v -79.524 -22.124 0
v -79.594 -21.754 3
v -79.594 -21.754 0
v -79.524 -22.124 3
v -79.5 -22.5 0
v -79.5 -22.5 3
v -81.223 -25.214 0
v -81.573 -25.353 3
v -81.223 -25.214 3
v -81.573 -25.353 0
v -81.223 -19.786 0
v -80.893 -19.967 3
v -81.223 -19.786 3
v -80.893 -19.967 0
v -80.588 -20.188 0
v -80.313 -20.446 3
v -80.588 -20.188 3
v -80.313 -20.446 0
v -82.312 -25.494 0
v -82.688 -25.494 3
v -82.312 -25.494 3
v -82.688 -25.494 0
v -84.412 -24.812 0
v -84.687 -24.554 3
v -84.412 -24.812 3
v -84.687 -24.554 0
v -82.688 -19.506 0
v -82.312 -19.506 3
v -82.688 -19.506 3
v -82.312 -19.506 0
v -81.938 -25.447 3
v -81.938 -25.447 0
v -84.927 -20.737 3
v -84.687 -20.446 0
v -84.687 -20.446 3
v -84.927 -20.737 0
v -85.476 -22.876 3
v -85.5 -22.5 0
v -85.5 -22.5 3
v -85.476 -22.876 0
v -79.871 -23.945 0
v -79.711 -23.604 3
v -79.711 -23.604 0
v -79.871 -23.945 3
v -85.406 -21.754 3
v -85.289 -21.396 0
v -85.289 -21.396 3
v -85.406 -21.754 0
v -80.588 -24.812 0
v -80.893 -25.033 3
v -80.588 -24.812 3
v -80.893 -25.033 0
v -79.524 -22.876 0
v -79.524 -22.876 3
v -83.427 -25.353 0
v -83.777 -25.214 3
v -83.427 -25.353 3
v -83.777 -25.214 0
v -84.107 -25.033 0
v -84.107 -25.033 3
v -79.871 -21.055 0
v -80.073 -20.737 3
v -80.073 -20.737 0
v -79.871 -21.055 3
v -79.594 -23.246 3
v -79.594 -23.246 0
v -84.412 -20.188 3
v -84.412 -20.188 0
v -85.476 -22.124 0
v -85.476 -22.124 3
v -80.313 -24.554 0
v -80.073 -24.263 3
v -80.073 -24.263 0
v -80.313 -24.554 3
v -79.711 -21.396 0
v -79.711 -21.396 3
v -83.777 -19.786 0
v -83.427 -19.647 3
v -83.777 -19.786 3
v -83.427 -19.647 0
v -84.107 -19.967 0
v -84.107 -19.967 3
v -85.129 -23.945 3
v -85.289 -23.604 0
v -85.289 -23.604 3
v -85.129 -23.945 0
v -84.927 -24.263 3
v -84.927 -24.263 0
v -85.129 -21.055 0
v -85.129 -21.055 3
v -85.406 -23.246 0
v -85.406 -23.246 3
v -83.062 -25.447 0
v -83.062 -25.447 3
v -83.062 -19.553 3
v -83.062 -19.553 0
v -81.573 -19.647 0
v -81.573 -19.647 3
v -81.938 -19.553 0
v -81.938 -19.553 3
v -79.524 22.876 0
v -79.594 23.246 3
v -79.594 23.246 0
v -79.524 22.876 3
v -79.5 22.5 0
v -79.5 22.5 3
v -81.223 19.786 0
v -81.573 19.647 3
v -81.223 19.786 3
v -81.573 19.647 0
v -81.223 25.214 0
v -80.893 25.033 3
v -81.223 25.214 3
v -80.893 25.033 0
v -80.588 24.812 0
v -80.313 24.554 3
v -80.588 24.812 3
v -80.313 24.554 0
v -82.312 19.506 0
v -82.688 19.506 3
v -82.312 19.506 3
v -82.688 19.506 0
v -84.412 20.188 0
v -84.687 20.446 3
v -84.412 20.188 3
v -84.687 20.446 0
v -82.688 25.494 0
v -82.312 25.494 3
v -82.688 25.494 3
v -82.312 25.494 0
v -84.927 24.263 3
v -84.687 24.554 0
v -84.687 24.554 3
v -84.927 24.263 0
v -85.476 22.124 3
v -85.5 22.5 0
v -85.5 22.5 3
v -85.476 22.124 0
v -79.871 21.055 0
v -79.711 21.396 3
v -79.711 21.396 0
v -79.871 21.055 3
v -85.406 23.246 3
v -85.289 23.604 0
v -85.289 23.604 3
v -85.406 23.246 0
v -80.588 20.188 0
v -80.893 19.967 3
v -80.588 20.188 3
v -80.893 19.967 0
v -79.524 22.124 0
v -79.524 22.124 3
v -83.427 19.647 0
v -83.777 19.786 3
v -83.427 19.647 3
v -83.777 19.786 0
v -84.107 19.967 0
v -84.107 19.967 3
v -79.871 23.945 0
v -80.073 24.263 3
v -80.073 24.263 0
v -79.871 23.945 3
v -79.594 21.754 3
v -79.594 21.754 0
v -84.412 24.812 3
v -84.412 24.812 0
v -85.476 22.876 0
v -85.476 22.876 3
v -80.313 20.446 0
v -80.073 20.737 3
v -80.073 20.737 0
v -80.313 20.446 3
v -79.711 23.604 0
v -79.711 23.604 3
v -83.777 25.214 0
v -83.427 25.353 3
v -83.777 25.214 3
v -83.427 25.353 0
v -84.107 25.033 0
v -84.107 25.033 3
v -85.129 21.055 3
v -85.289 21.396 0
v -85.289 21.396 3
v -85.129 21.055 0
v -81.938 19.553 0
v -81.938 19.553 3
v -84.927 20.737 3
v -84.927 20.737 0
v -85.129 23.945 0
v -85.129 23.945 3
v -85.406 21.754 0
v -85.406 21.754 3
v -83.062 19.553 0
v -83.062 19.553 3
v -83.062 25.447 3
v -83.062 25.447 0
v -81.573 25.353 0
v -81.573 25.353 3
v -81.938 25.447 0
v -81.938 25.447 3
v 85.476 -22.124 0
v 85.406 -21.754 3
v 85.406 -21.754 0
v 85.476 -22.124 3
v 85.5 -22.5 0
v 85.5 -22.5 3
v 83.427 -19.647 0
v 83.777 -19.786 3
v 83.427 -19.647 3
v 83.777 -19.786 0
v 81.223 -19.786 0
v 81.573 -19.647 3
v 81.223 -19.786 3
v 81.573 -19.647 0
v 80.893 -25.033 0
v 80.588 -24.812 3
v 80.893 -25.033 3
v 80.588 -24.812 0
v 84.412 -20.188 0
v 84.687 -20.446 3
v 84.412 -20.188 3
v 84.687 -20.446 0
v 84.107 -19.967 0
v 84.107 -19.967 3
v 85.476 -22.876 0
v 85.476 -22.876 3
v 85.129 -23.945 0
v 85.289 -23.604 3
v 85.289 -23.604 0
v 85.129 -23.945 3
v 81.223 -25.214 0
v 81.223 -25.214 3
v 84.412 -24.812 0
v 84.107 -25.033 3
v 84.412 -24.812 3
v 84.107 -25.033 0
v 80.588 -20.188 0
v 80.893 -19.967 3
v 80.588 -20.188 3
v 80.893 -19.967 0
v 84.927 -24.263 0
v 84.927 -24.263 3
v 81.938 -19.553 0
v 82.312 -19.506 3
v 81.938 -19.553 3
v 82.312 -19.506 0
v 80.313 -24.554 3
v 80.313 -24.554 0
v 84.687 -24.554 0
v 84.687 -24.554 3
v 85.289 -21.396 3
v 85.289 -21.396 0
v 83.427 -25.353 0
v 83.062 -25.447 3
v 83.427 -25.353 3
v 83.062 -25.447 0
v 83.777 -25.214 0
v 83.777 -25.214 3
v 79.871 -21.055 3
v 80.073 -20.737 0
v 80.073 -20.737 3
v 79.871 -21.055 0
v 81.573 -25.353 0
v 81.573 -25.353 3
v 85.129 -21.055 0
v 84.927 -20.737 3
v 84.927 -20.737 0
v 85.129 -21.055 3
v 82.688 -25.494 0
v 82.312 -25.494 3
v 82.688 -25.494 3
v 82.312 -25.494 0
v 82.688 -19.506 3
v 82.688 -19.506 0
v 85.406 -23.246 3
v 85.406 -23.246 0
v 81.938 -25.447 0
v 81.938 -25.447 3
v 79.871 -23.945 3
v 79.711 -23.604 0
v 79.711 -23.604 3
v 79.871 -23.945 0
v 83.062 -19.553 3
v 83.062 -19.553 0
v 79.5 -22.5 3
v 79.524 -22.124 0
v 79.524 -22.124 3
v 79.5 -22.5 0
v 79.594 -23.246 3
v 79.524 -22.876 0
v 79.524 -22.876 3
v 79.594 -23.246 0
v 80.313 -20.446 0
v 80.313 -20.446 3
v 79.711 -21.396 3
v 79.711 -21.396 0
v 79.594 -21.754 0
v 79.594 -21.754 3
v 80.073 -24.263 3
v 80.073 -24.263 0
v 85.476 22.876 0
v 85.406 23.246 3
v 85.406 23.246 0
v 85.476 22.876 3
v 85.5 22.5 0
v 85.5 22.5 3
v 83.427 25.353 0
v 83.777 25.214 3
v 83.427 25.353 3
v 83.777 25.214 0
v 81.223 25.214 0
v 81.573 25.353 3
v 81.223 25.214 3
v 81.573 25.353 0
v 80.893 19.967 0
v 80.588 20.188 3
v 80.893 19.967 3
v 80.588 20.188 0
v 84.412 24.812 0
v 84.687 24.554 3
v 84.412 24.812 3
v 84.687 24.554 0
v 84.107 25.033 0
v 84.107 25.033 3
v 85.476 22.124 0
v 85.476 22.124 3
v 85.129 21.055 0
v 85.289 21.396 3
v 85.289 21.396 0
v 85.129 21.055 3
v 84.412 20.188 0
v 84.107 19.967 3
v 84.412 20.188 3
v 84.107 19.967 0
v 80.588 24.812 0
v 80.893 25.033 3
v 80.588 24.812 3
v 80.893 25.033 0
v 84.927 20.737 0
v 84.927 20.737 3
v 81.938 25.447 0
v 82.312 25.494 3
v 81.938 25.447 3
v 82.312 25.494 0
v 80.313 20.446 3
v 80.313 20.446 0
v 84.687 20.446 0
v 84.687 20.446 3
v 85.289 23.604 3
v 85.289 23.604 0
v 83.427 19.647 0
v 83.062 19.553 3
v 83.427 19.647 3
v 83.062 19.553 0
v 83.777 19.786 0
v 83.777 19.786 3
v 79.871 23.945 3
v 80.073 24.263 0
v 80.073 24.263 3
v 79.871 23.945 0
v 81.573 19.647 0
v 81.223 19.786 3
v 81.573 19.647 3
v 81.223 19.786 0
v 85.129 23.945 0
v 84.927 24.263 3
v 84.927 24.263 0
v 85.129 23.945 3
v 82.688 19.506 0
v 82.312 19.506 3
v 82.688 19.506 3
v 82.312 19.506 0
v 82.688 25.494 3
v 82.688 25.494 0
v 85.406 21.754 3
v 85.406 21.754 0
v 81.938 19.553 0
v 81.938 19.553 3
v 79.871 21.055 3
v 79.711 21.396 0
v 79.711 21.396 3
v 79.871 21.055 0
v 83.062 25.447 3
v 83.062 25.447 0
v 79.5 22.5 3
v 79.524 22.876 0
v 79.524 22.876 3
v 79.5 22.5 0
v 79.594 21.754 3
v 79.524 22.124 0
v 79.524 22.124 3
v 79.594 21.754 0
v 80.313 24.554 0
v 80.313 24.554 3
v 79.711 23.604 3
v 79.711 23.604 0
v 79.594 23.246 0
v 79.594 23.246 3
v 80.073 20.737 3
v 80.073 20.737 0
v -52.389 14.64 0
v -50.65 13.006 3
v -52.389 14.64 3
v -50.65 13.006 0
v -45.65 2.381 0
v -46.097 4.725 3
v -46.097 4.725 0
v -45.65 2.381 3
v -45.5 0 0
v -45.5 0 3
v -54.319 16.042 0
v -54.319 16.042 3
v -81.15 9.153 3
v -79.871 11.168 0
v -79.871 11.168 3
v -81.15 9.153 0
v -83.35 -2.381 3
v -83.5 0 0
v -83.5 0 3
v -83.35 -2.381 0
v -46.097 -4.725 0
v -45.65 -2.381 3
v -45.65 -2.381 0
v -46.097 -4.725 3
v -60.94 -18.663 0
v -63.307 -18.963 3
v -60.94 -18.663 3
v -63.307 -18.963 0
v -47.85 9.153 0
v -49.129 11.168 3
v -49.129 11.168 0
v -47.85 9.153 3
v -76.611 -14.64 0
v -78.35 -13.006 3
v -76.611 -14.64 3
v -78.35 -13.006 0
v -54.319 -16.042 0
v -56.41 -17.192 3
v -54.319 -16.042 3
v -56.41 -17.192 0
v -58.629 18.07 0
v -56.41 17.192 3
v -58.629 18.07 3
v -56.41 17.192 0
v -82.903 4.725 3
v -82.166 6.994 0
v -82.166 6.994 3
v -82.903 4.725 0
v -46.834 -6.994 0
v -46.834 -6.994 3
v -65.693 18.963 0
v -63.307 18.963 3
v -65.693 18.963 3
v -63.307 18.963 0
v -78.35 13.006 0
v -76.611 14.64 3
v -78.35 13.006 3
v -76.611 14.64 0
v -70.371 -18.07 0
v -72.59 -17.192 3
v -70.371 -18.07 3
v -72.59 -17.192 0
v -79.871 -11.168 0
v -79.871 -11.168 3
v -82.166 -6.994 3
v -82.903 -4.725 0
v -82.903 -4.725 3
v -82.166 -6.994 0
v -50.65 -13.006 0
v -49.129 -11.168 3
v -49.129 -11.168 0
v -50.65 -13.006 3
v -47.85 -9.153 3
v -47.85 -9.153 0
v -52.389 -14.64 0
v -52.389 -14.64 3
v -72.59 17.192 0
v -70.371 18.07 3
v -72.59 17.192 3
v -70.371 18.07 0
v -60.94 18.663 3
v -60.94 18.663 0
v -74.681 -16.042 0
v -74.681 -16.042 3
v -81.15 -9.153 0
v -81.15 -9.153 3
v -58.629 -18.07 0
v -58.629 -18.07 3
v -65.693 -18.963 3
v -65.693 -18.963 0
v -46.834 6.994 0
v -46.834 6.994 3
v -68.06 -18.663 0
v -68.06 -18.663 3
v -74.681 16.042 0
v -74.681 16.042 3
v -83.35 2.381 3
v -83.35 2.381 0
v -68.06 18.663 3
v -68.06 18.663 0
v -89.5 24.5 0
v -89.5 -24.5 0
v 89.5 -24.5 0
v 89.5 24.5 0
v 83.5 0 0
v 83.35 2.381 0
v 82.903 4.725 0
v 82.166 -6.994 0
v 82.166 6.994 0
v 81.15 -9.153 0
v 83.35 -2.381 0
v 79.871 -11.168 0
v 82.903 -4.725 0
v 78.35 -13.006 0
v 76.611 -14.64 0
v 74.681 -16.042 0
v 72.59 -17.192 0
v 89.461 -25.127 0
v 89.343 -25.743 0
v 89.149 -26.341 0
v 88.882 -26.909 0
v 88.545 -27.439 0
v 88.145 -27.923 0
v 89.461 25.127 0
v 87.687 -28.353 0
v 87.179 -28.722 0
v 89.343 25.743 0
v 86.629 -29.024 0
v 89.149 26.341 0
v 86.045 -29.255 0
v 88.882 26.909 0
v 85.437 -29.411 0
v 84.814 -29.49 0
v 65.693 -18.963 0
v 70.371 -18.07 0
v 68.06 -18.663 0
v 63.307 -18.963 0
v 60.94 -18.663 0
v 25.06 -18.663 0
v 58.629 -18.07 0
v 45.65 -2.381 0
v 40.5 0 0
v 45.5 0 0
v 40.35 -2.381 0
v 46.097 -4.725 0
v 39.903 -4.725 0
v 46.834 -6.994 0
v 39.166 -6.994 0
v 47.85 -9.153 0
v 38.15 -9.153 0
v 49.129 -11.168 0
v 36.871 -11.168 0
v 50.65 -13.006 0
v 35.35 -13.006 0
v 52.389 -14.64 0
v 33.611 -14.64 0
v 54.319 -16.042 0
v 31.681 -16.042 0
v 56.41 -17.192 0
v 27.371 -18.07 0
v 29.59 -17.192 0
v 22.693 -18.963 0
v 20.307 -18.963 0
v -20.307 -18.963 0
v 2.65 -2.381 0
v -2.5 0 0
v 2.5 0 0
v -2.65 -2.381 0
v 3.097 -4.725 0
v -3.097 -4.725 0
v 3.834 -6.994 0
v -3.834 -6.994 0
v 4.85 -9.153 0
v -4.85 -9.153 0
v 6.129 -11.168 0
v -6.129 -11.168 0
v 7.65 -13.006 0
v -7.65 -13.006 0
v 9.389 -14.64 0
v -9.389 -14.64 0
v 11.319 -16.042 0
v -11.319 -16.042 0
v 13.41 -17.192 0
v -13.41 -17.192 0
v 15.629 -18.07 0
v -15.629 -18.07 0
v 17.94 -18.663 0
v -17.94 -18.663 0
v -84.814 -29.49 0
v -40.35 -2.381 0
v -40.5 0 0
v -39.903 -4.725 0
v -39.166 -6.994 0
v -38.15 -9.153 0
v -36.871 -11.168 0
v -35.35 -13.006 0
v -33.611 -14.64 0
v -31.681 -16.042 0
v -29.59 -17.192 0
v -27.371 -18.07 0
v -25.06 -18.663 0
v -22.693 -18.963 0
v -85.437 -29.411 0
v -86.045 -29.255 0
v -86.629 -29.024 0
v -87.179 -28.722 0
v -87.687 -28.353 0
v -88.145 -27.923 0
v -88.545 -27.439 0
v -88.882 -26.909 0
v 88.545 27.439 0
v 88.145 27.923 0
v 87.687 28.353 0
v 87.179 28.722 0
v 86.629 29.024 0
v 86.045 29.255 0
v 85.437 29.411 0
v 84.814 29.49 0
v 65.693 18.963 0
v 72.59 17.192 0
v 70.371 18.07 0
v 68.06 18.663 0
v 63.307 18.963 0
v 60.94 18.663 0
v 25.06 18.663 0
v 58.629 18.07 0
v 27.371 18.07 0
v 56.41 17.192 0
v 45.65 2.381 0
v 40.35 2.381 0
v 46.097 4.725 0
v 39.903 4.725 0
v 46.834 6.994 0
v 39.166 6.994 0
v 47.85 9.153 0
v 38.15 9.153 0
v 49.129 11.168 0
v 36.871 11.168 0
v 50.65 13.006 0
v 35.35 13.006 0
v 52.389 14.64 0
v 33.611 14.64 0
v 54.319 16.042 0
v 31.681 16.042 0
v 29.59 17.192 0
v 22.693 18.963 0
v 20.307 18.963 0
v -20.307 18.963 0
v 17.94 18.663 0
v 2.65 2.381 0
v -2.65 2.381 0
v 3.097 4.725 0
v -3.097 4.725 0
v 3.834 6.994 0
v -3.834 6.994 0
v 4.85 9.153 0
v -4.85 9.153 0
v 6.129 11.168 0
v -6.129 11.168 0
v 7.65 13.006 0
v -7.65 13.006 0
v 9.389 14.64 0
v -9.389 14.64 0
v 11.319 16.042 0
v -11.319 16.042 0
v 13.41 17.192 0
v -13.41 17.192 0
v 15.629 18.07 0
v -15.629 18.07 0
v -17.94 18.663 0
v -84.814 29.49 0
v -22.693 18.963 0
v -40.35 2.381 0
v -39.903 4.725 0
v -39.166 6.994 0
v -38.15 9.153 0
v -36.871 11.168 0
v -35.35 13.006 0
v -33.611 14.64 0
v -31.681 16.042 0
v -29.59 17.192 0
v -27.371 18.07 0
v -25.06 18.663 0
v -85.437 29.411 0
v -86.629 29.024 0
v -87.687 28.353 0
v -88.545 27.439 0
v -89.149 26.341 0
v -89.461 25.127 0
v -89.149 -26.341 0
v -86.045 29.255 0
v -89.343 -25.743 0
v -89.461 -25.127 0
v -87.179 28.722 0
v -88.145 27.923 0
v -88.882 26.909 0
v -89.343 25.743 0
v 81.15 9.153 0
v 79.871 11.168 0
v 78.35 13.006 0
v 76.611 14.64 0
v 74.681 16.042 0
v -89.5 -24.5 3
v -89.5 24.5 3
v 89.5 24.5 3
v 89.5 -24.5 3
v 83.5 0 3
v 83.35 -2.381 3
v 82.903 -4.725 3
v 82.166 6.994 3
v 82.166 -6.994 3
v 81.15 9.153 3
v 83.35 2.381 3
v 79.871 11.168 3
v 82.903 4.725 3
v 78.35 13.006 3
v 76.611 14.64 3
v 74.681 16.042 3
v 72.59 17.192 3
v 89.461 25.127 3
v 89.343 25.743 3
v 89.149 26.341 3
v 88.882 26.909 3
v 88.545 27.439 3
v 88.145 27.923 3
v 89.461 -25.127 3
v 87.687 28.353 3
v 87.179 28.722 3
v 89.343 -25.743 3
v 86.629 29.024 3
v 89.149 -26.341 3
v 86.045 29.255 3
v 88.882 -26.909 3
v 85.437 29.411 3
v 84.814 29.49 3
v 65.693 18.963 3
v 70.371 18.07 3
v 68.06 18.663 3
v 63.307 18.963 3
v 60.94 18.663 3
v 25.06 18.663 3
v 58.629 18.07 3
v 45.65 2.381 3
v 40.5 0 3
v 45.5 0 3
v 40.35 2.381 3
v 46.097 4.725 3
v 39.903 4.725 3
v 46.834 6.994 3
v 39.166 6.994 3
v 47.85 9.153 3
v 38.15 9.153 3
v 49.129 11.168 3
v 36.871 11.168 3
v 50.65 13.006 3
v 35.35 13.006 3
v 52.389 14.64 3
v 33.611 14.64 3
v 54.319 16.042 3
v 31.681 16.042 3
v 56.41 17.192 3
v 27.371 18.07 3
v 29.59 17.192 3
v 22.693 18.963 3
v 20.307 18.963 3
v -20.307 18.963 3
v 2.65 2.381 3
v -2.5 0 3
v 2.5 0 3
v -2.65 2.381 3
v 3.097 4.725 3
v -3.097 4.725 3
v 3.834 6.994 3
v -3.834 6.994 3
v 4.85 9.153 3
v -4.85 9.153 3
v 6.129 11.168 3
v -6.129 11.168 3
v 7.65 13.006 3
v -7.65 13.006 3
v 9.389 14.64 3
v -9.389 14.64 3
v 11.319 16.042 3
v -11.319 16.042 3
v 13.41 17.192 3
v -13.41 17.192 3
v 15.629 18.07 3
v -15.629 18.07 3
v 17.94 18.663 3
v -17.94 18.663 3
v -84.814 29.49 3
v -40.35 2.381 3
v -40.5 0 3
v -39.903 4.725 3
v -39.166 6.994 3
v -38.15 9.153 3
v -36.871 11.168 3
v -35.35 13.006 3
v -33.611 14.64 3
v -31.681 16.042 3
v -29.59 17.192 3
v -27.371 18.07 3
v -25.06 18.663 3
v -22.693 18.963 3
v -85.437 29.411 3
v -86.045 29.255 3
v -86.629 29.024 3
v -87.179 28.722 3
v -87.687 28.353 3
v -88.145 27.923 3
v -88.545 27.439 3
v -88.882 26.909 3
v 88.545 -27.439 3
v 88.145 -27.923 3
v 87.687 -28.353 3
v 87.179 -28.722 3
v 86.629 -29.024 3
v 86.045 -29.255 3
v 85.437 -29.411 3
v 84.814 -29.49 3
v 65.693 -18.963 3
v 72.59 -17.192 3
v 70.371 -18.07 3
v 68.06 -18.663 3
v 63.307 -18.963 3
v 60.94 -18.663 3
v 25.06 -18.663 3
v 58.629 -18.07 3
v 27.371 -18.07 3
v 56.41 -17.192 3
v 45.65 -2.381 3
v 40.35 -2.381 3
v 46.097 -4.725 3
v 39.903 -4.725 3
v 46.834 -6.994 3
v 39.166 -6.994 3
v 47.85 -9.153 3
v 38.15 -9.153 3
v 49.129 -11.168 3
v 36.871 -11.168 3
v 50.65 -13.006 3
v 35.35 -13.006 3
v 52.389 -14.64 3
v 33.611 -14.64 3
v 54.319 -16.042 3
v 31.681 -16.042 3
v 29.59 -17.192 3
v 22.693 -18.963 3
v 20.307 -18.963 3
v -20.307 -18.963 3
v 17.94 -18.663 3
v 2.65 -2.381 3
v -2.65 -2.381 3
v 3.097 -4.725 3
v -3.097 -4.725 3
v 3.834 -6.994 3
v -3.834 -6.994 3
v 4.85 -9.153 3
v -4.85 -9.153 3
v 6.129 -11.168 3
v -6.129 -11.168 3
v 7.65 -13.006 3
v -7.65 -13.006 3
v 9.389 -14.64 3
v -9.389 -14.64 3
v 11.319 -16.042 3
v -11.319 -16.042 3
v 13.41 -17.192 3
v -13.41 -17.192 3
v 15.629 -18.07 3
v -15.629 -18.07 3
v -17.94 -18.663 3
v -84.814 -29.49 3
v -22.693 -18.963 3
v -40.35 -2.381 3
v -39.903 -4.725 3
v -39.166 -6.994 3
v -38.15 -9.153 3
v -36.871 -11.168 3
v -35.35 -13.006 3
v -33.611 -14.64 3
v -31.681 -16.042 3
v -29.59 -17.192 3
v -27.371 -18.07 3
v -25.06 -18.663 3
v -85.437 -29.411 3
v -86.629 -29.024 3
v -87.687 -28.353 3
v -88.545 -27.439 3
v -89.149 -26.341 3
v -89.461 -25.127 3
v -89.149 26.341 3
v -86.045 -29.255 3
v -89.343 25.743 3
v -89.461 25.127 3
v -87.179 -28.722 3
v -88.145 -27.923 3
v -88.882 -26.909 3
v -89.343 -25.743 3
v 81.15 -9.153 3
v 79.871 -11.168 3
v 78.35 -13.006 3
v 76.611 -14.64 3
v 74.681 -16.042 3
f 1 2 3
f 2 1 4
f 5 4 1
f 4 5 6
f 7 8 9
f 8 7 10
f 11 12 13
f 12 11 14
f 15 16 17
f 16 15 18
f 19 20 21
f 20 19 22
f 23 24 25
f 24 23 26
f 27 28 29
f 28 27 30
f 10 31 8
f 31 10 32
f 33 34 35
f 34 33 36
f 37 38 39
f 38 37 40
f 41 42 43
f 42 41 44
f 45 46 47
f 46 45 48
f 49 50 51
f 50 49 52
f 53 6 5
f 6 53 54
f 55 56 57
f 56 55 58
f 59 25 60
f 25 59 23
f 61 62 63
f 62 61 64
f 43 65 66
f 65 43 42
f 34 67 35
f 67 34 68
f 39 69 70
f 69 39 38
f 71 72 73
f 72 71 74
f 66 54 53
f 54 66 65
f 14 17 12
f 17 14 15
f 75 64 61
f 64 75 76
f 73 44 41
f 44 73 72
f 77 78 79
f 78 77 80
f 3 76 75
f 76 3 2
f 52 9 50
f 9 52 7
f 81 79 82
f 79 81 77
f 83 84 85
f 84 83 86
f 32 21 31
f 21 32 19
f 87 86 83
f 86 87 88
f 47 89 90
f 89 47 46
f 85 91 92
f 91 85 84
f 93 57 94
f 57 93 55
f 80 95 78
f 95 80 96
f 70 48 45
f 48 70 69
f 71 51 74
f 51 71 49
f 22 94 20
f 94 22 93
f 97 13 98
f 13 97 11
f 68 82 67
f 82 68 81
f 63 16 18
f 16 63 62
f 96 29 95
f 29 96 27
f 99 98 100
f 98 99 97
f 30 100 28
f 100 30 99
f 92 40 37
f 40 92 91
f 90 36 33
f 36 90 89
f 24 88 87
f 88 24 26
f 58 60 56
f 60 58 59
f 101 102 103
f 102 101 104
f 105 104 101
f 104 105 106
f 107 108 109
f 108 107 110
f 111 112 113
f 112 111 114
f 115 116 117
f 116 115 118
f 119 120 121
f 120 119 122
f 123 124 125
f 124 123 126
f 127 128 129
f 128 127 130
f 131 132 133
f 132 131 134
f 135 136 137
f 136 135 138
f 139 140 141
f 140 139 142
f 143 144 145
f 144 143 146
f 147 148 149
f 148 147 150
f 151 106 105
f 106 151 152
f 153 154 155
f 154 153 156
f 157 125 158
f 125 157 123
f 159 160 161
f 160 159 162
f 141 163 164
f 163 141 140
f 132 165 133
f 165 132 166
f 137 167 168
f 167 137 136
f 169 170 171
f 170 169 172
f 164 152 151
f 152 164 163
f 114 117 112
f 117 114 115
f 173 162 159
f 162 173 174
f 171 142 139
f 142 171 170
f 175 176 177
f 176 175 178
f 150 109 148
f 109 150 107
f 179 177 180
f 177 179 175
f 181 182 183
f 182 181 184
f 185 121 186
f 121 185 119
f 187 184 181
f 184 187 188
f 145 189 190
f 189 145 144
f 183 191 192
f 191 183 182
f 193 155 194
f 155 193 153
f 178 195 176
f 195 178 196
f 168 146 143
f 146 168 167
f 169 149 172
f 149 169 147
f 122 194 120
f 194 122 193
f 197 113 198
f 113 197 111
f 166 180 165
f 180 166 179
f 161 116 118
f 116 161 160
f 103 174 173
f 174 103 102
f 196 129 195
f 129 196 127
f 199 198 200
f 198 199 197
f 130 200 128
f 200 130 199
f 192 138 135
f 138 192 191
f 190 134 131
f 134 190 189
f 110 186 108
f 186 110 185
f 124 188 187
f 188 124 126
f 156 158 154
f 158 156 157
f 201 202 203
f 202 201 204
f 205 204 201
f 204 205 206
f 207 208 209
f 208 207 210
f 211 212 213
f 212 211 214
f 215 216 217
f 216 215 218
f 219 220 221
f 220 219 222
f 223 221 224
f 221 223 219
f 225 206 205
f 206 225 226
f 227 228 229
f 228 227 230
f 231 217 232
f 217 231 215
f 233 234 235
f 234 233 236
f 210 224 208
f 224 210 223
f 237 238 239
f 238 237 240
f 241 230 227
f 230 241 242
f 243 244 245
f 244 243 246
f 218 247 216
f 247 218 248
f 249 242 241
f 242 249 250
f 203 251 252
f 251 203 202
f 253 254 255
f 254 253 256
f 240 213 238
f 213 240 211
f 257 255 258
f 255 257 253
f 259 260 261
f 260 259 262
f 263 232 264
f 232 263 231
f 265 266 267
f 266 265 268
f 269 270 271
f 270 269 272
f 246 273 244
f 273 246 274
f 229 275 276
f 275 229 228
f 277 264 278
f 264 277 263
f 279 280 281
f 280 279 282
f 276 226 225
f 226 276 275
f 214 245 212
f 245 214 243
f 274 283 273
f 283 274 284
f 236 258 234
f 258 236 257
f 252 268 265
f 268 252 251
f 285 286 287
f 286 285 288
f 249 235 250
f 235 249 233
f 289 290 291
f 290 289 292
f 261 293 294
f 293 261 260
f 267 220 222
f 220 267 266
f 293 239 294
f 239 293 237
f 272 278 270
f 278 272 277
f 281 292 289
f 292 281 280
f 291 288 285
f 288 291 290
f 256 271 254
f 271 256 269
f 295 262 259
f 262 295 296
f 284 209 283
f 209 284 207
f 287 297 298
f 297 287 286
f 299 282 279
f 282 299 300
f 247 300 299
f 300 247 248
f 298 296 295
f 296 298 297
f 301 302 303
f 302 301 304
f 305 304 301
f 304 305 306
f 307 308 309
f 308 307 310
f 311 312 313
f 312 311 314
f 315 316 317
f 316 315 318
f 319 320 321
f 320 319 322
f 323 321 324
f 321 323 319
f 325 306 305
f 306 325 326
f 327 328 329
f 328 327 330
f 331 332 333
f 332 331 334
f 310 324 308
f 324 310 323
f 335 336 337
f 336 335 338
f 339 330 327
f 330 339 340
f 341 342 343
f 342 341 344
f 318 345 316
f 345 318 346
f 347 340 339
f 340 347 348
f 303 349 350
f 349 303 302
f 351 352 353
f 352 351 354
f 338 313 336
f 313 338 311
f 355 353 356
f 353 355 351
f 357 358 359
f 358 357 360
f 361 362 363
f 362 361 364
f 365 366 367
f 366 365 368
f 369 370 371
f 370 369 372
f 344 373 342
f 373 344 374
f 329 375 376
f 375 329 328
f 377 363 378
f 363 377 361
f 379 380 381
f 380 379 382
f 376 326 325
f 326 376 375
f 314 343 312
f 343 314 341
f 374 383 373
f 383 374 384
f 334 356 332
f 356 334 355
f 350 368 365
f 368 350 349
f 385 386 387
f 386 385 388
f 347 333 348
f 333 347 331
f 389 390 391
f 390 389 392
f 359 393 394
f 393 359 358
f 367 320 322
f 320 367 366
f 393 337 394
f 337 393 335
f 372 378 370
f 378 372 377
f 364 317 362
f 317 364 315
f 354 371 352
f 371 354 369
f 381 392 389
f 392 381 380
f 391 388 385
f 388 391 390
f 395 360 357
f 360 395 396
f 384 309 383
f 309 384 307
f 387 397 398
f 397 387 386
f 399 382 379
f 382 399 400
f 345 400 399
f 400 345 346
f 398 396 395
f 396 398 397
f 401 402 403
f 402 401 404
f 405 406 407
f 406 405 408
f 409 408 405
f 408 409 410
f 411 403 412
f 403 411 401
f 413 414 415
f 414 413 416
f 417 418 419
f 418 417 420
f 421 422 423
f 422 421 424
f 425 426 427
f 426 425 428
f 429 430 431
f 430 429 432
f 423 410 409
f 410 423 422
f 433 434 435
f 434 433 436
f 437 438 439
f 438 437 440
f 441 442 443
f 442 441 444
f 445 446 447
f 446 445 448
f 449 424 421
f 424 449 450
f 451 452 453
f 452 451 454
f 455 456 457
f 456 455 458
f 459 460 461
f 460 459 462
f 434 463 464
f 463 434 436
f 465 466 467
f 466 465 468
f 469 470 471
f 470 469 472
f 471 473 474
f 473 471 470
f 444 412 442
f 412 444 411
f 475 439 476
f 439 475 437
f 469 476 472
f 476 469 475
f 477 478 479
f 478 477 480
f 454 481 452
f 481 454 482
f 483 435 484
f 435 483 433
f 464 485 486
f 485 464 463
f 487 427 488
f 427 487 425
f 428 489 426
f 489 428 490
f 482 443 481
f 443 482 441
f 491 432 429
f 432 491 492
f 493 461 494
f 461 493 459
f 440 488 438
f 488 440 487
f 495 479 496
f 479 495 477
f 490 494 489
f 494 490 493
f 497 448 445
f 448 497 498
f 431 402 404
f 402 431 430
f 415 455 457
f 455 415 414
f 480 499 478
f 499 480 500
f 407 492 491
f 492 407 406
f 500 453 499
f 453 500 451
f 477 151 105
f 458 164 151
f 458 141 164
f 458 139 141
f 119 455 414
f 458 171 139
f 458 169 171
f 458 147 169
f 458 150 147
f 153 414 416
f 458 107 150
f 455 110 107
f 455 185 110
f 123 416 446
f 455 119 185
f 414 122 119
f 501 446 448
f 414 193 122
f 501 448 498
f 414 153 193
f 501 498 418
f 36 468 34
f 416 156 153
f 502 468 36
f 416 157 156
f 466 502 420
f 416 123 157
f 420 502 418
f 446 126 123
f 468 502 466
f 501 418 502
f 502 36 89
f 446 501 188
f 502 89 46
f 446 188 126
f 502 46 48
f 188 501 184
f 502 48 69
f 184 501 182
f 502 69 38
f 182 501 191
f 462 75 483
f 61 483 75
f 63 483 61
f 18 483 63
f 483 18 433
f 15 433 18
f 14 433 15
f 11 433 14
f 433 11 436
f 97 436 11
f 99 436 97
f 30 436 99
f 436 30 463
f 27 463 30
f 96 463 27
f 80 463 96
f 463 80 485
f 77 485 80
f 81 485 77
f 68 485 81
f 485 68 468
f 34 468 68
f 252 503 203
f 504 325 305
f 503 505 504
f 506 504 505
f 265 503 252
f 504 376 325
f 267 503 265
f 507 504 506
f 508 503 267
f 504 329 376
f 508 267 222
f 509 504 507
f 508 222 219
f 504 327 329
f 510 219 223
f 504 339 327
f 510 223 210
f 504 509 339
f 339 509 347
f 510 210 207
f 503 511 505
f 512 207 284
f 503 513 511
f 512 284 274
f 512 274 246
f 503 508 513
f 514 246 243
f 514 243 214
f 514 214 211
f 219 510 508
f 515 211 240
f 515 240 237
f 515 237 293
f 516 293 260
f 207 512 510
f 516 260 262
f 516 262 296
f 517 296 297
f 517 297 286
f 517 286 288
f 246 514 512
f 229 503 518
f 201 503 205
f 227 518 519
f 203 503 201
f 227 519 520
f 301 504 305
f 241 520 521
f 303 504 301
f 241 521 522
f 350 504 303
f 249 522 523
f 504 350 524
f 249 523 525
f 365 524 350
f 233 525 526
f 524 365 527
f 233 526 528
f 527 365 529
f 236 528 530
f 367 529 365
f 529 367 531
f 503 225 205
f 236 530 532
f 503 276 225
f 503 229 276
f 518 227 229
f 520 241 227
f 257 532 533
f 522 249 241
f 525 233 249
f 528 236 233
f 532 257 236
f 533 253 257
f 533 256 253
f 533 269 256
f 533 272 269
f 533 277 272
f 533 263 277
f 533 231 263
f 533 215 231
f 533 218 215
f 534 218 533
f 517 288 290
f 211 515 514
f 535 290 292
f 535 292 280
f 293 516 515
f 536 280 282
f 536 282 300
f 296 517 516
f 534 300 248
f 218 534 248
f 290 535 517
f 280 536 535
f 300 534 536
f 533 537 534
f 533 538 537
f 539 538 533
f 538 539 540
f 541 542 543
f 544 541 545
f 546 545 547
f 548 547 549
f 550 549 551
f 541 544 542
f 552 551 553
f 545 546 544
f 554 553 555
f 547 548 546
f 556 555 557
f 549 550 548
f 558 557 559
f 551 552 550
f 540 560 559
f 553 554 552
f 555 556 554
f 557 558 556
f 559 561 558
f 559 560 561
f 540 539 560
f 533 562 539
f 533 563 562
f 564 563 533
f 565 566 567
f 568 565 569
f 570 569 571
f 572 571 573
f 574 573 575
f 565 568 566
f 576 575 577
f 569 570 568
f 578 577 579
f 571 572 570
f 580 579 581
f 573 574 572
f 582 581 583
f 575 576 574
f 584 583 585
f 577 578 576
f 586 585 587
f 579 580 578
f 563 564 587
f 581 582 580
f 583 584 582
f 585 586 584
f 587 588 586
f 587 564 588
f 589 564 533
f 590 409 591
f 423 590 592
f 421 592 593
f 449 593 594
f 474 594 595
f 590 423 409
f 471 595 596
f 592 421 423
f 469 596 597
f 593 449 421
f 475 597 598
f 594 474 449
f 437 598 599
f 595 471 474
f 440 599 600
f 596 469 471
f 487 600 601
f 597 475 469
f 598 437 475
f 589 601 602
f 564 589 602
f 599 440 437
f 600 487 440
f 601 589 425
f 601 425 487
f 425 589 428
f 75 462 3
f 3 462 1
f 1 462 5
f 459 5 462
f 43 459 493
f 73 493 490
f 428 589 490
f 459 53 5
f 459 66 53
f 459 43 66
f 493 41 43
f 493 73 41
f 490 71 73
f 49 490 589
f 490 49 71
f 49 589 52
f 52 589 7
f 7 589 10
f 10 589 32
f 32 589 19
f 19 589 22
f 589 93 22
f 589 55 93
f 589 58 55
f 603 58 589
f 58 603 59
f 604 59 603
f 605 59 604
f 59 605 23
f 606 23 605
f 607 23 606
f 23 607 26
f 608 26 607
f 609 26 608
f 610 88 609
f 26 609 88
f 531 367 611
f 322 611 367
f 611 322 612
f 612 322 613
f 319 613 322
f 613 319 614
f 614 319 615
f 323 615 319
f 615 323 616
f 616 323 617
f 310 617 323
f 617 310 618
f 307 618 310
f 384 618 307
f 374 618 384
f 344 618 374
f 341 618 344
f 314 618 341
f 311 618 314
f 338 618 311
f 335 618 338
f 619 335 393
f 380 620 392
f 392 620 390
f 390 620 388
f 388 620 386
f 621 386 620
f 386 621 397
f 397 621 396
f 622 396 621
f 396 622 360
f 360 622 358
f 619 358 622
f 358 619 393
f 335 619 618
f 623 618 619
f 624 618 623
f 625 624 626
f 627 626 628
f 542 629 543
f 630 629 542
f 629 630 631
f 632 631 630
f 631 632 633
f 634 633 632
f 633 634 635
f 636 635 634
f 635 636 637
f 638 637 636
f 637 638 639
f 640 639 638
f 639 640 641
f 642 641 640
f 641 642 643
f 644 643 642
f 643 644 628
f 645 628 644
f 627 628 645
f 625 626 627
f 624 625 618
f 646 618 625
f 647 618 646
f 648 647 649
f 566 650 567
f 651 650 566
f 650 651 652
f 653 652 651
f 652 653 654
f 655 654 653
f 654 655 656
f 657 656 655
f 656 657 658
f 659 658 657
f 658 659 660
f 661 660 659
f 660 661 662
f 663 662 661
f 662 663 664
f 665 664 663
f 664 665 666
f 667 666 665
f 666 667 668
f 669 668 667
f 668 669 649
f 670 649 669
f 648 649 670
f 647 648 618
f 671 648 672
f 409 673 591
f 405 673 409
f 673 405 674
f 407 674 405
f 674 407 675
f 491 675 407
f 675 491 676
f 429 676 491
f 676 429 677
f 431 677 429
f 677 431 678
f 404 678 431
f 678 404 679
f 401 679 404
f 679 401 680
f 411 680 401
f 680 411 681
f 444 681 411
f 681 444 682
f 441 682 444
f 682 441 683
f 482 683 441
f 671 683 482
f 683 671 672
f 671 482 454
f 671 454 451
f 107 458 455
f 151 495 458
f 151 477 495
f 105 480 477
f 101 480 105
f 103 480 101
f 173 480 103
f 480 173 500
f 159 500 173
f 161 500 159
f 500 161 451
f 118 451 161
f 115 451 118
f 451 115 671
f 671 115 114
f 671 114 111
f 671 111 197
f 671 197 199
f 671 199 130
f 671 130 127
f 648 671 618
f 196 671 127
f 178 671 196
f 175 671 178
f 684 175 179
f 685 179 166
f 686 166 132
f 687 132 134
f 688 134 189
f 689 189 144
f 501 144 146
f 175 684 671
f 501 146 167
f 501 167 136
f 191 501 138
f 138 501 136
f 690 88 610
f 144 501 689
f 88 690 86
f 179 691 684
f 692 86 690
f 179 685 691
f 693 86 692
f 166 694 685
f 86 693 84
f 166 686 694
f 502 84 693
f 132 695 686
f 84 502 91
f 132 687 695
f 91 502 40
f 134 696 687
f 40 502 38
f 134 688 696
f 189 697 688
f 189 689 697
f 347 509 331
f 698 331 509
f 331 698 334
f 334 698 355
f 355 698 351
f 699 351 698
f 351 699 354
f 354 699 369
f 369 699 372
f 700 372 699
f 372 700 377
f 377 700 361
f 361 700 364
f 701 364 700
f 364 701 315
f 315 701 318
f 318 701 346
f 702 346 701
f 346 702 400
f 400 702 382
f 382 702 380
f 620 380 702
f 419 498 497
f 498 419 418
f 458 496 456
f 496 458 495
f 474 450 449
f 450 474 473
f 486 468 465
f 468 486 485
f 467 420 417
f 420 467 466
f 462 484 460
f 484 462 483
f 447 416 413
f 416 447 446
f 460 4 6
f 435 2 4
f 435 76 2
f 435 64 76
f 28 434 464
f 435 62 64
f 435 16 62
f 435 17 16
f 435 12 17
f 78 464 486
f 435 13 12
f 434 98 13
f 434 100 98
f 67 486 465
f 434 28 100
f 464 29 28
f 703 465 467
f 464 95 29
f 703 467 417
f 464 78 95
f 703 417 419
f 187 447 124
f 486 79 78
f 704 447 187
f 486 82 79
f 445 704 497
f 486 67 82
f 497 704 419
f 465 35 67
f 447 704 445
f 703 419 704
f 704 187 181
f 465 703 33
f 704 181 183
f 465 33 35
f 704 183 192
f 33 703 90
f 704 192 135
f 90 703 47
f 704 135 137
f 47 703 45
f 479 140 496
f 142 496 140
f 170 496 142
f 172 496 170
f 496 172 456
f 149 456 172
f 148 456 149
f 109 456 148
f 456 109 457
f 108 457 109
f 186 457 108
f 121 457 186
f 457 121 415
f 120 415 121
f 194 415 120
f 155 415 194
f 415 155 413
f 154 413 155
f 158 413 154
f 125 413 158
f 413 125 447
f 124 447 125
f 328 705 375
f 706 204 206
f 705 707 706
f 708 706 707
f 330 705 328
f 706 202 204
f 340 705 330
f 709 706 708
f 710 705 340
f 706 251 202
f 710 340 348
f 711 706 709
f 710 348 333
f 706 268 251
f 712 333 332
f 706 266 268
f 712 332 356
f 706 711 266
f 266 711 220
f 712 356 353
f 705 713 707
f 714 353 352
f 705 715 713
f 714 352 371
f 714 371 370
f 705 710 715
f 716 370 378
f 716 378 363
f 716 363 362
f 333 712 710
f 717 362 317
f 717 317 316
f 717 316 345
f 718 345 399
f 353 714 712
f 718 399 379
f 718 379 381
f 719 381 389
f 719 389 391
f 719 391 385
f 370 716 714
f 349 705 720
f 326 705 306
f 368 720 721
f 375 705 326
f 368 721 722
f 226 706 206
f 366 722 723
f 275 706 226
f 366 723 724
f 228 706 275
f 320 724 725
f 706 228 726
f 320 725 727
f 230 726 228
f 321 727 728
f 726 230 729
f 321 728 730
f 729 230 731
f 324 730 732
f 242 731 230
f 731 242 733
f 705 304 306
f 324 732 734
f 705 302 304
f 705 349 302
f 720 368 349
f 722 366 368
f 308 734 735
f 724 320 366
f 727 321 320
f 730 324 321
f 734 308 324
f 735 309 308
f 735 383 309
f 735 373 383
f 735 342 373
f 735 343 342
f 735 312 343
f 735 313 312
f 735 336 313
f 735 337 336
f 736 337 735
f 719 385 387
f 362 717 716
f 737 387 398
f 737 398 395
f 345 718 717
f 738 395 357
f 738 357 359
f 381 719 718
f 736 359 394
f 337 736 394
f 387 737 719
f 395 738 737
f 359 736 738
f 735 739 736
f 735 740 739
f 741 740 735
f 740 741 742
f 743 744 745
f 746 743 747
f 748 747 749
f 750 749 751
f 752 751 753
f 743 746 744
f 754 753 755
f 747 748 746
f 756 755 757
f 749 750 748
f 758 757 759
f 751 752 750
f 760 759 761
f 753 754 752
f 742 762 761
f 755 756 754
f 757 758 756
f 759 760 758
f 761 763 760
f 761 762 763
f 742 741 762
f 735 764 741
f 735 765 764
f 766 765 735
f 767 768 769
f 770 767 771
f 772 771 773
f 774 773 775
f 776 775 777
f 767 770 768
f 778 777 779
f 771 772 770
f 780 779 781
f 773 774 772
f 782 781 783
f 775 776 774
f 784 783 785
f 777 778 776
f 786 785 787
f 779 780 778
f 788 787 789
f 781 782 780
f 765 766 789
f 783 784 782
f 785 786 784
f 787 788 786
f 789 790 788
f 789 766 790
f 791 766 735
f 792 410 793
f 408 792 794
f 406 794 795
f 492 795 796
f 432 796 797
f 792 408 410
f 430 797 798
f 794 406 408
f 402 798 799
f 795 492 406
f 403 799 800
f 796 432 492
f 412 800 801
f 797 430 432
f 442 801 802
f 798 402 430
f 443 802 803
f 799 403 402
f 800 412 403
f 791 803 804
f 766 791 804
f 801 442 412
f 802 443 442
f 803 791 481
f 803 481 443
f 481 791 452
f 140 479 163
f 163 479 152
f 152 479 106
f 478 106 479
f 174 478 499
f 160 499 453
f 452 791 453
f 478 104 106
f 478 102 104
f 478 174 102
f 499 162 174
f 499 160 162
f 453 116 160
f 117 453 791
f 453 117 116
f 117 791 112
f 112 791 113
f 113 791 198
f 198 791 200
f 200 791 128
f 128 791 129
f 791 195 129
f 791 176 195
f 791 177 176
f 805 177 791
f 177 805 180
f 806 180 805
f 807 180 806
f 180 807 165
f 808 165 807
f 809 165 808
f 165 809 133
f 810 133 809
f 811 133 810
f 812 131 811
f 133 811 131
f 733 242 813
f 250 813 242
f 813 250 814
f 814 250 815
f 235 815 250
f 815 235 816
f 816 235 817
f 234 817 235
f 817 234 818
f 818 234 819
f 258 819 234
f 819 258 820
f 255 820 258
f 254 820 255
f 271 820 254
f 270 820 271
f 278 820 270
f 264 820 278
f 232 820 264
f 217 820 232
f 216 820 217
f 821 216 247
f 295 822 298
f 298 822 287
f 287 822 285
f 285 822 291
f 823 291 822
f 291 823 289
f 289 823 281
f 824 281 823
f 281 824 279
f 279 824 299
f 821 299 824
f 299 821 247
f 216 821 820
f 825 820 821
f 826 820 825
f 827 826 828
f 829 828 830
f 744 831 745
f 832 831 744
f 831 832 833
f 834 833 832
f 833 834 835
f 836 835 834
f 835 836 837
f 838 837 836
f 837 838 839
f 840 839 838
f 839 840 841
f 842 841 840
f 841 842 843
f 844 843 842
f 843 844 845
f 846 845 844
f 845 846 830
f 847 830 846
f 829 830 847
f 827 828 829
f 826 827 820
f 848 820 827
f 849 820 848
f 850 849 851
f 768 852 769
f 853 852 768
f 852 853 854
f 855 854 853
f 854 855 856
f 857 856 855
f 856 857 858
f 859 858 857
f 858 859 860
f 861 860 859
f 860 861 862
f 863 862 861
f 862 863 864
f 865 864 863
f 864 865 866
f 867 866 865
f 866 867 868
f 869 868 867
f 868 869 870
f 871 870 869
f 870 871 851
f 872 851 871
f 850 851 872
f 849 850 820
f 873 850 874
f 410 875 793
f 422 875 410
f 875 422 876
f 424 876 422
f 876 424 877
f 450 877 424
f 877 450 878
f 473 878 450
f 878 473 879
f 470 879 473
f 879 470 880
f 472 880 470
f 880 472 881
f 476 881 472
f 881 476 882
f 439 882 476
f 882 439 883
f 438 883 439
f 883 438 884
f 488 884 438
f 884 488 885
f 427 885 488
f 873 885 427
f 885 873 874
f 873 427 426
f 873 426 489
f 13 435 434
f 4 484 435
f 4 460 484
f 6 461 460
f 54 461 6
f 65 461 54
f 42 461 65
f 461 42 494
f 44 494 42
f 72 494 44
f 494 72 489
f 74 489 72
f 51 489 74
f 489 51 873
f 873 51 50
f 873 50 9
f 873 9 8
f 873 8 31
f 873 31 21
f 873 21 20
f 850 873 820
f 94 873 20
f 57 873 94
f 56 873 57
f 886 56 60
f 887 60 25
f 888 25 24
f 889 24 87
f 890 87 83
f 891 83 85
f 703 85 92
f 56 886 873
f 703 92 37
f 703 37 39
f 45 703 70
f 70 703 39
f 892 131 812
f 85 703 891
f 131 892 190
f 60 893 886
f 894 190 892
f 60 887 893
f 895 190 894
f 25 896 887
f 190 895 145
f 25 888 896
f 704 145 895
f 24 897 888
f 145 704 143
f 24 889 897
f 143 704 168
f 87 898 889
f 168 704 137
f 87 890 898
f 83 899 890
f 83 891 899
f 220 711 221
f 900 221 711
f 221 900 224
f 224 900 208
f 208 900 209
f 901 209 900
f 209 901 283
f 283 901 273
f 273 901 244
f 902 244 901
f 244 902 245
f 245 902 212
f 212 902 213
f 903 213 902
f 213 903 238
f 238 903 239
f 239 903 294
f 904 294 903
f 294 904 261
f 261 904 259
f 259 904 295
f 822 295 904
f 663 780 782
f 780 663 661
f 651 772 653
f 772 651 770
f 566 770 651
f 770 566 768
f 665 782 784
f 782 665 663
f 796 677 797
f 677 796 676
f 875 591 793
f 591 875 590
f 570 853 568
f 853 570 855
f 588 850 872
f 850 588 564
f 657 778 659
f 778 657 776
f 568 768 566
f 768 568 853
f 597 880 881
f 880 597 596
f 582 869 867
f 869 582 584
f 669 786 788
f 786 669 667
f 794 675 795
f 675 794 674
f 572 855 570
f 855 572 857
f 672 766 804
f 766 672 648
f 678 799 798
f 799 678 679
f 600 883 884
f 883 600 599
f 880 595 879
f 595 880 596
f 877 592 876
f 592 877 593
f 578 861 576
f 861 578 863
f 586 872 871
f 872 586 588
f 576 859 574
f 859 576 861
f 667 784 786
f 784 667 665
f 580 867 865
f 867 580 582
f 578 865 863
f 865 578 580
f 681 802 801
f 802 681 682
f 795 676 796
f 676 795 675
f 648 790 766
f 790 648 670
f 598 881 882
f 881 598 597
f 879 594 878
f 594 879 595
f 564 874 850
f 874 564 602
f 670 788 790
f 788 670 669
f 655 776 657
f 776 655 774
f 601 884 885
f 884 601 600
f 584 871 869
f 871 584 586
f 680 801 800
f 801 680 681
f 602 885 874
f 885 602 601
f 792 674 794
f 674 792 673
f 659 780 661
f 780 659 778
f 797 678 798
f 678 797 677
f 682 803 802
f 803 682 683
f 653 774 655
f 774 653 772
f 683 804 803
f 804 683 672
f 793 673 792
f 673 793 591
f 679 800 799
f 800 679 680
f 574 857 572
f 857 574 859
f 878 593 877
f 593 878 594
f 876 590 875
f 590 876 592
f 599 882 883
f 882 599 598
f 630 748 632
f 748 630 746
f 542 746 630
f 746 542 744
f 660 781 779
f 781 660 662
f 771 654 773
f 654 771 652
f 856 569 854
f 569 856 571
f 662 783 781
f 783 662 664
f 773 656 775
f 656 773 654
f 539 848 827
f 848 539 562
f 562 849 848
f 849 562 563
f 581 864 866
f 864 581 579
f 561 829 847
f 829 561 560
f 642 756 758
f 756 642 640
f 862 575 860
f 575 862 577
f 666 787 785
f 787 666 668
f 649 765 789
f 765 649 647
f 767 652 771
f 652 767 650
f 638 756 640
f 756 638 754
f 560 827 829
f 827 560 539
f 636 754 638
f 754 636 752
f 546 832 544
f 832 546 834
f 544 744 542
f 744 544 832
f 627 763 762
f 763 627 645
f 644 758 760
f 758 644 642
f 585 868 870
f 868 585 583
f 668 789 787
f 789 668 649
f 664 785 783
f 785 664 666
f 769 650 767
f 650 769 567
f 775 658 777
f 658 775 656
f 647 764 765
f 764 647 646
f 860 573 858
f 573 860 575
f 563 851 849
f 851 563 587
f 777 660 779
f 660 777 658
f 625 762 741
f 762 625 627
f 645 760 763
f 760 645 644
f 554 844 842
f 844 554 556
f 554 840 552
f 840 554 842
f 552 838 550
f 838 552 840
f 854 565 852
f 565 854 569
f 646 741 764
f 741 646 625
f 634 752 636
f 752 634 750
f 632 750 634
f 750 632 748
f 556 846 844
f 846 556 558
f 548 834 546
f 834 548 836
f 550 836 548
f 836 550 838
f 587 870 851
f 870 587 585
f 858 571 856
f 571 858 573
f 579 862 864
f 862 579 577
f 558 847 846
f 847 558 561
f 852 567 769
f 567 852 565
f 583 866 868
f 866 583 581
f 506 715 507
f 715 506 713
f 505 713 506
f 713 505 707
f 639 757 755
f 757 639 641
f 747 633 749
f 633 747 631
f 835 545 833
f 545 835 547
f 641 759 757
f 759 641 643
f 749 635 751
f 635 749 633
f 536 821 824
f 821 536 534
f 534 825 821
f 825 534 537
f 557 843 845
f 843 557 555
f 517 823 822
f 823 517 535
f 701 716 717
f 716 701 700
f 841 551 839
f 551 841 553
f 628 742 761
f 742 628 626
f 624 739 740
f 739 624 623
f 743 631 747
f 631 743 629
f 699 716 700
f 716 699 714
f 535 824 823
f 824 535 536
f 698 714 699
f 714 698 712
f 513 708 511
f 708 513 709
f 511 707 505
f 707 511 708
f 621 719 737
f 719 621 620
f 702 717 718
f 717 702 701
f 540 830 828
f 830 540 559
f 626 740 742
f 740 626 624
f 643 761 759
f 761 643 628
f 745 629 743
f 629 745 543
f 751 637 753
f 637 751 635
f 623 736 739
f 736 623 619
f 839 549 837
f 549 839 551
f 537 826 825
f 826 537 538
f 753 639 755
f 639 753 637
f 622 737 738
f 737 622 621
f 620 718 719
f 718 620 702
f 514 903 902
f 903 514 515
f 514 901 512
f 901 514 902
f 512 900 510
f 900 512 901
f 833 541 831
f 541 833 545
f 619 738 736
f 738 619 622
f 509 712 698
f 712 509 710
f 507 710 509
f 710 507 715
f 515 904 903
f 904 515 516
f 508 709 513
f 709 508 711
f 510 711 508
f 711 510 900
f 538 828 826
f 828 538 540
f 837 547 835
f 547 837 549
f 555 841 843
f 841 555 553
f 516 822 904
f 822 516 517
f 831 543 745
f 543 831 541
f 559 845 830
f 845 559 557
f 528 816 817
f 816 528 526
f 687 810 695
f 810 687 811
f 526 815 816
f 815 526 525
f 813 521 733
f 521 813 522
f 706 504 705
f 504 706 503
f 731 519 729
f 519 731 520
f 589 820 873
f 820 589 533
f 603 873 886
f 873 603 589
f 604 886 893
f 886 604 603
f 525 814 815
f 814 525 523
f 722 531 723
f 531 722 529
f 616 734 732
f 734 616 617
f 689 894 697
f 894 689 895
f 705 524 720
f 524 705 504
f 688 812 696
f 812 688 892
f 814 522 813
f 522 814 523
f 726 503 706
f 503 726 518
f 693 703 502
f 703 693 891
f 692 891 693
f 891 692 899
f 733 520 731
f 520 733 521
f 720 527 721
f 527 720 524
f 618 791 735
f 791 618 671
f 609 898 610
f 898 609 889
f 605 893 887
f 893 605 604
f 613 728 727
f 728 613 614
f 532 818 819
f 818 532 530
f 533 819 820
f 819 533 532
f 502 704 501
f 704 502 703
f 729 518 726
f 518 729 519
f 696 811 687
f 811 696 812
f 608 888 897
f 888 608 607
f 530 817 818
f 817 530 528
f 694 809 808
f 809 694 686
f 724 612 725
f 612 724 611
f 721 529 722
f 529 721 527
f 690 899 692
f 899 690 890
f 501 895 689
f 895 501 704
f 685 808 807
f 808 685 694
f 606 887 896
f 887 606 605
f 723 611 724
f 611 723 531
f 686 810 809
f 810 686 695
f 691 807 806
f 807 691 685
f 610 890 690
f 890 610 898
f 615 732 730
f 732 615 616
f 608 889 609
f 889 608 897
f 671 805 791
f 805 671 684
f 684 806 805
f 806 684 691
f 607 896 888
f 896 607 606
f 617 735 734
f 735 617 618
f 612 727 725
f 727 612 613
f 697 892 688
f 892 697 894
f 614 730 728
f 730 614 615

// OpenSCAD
$fn = 50;


difference() {
	union() {
		hull() {
			translate(v = [-84.5000000000, 24.5000000000, 0]) {
				cylinder(h = 3, r = 5);
			}
			translate(v = [84.5000000000, 24.5000000000, 0]) {
				cylinder(h = 3, r = 5);
			}
			translate(v = [-84.5000000000, -24.5000000000, 0]) {
				cylinder(h = 3, r = 5);
			}
			translate(v = [84.5000000000, -24.5000000000, 0]) {
				cylinder(h = 3, r = 5);
			}
		}
	}
	union() {
		#translate(v = [-82.5000000000, -22.5000000000, -100.0000000000]) {
			cylinder(h = 200, r = 3.0000000000);
		}
		#translate(v = [-82.5000000000, 22.5000000000, -100.0000000000]) {
			cylinder(h = 200, r = 3.0000000000);
		}
		#translate(v = [82.5000000000, -22.5000000000, -100.0000000000]) {
			cylinder(h = 200, r = 3.0000000000);
		}
		#translate(v = [82.5000000000, 22.5000000000, -100.0000000000]) {
			cylinder(h = 200, r = 3.0000000000);
		}
		#translate(v = [-64.5000000000, 0, 0]) {
			cylinder(h = 3, r = 19.0000000000);
		}
		#translate(v = [-21.5000000000, 0, 0]) {
			cylinder(h = 3, r = 19.0000000000);
		}
		#translate(v = [21.5000000000, 0, 0]) {
			cylinder(h = 3, r = 19.0000000000);
		}
		#translate(v = [64.5000000000, 0, 0]) {
			cylinder(h = 3, r = 19.0000000000);
		}
	}
}
